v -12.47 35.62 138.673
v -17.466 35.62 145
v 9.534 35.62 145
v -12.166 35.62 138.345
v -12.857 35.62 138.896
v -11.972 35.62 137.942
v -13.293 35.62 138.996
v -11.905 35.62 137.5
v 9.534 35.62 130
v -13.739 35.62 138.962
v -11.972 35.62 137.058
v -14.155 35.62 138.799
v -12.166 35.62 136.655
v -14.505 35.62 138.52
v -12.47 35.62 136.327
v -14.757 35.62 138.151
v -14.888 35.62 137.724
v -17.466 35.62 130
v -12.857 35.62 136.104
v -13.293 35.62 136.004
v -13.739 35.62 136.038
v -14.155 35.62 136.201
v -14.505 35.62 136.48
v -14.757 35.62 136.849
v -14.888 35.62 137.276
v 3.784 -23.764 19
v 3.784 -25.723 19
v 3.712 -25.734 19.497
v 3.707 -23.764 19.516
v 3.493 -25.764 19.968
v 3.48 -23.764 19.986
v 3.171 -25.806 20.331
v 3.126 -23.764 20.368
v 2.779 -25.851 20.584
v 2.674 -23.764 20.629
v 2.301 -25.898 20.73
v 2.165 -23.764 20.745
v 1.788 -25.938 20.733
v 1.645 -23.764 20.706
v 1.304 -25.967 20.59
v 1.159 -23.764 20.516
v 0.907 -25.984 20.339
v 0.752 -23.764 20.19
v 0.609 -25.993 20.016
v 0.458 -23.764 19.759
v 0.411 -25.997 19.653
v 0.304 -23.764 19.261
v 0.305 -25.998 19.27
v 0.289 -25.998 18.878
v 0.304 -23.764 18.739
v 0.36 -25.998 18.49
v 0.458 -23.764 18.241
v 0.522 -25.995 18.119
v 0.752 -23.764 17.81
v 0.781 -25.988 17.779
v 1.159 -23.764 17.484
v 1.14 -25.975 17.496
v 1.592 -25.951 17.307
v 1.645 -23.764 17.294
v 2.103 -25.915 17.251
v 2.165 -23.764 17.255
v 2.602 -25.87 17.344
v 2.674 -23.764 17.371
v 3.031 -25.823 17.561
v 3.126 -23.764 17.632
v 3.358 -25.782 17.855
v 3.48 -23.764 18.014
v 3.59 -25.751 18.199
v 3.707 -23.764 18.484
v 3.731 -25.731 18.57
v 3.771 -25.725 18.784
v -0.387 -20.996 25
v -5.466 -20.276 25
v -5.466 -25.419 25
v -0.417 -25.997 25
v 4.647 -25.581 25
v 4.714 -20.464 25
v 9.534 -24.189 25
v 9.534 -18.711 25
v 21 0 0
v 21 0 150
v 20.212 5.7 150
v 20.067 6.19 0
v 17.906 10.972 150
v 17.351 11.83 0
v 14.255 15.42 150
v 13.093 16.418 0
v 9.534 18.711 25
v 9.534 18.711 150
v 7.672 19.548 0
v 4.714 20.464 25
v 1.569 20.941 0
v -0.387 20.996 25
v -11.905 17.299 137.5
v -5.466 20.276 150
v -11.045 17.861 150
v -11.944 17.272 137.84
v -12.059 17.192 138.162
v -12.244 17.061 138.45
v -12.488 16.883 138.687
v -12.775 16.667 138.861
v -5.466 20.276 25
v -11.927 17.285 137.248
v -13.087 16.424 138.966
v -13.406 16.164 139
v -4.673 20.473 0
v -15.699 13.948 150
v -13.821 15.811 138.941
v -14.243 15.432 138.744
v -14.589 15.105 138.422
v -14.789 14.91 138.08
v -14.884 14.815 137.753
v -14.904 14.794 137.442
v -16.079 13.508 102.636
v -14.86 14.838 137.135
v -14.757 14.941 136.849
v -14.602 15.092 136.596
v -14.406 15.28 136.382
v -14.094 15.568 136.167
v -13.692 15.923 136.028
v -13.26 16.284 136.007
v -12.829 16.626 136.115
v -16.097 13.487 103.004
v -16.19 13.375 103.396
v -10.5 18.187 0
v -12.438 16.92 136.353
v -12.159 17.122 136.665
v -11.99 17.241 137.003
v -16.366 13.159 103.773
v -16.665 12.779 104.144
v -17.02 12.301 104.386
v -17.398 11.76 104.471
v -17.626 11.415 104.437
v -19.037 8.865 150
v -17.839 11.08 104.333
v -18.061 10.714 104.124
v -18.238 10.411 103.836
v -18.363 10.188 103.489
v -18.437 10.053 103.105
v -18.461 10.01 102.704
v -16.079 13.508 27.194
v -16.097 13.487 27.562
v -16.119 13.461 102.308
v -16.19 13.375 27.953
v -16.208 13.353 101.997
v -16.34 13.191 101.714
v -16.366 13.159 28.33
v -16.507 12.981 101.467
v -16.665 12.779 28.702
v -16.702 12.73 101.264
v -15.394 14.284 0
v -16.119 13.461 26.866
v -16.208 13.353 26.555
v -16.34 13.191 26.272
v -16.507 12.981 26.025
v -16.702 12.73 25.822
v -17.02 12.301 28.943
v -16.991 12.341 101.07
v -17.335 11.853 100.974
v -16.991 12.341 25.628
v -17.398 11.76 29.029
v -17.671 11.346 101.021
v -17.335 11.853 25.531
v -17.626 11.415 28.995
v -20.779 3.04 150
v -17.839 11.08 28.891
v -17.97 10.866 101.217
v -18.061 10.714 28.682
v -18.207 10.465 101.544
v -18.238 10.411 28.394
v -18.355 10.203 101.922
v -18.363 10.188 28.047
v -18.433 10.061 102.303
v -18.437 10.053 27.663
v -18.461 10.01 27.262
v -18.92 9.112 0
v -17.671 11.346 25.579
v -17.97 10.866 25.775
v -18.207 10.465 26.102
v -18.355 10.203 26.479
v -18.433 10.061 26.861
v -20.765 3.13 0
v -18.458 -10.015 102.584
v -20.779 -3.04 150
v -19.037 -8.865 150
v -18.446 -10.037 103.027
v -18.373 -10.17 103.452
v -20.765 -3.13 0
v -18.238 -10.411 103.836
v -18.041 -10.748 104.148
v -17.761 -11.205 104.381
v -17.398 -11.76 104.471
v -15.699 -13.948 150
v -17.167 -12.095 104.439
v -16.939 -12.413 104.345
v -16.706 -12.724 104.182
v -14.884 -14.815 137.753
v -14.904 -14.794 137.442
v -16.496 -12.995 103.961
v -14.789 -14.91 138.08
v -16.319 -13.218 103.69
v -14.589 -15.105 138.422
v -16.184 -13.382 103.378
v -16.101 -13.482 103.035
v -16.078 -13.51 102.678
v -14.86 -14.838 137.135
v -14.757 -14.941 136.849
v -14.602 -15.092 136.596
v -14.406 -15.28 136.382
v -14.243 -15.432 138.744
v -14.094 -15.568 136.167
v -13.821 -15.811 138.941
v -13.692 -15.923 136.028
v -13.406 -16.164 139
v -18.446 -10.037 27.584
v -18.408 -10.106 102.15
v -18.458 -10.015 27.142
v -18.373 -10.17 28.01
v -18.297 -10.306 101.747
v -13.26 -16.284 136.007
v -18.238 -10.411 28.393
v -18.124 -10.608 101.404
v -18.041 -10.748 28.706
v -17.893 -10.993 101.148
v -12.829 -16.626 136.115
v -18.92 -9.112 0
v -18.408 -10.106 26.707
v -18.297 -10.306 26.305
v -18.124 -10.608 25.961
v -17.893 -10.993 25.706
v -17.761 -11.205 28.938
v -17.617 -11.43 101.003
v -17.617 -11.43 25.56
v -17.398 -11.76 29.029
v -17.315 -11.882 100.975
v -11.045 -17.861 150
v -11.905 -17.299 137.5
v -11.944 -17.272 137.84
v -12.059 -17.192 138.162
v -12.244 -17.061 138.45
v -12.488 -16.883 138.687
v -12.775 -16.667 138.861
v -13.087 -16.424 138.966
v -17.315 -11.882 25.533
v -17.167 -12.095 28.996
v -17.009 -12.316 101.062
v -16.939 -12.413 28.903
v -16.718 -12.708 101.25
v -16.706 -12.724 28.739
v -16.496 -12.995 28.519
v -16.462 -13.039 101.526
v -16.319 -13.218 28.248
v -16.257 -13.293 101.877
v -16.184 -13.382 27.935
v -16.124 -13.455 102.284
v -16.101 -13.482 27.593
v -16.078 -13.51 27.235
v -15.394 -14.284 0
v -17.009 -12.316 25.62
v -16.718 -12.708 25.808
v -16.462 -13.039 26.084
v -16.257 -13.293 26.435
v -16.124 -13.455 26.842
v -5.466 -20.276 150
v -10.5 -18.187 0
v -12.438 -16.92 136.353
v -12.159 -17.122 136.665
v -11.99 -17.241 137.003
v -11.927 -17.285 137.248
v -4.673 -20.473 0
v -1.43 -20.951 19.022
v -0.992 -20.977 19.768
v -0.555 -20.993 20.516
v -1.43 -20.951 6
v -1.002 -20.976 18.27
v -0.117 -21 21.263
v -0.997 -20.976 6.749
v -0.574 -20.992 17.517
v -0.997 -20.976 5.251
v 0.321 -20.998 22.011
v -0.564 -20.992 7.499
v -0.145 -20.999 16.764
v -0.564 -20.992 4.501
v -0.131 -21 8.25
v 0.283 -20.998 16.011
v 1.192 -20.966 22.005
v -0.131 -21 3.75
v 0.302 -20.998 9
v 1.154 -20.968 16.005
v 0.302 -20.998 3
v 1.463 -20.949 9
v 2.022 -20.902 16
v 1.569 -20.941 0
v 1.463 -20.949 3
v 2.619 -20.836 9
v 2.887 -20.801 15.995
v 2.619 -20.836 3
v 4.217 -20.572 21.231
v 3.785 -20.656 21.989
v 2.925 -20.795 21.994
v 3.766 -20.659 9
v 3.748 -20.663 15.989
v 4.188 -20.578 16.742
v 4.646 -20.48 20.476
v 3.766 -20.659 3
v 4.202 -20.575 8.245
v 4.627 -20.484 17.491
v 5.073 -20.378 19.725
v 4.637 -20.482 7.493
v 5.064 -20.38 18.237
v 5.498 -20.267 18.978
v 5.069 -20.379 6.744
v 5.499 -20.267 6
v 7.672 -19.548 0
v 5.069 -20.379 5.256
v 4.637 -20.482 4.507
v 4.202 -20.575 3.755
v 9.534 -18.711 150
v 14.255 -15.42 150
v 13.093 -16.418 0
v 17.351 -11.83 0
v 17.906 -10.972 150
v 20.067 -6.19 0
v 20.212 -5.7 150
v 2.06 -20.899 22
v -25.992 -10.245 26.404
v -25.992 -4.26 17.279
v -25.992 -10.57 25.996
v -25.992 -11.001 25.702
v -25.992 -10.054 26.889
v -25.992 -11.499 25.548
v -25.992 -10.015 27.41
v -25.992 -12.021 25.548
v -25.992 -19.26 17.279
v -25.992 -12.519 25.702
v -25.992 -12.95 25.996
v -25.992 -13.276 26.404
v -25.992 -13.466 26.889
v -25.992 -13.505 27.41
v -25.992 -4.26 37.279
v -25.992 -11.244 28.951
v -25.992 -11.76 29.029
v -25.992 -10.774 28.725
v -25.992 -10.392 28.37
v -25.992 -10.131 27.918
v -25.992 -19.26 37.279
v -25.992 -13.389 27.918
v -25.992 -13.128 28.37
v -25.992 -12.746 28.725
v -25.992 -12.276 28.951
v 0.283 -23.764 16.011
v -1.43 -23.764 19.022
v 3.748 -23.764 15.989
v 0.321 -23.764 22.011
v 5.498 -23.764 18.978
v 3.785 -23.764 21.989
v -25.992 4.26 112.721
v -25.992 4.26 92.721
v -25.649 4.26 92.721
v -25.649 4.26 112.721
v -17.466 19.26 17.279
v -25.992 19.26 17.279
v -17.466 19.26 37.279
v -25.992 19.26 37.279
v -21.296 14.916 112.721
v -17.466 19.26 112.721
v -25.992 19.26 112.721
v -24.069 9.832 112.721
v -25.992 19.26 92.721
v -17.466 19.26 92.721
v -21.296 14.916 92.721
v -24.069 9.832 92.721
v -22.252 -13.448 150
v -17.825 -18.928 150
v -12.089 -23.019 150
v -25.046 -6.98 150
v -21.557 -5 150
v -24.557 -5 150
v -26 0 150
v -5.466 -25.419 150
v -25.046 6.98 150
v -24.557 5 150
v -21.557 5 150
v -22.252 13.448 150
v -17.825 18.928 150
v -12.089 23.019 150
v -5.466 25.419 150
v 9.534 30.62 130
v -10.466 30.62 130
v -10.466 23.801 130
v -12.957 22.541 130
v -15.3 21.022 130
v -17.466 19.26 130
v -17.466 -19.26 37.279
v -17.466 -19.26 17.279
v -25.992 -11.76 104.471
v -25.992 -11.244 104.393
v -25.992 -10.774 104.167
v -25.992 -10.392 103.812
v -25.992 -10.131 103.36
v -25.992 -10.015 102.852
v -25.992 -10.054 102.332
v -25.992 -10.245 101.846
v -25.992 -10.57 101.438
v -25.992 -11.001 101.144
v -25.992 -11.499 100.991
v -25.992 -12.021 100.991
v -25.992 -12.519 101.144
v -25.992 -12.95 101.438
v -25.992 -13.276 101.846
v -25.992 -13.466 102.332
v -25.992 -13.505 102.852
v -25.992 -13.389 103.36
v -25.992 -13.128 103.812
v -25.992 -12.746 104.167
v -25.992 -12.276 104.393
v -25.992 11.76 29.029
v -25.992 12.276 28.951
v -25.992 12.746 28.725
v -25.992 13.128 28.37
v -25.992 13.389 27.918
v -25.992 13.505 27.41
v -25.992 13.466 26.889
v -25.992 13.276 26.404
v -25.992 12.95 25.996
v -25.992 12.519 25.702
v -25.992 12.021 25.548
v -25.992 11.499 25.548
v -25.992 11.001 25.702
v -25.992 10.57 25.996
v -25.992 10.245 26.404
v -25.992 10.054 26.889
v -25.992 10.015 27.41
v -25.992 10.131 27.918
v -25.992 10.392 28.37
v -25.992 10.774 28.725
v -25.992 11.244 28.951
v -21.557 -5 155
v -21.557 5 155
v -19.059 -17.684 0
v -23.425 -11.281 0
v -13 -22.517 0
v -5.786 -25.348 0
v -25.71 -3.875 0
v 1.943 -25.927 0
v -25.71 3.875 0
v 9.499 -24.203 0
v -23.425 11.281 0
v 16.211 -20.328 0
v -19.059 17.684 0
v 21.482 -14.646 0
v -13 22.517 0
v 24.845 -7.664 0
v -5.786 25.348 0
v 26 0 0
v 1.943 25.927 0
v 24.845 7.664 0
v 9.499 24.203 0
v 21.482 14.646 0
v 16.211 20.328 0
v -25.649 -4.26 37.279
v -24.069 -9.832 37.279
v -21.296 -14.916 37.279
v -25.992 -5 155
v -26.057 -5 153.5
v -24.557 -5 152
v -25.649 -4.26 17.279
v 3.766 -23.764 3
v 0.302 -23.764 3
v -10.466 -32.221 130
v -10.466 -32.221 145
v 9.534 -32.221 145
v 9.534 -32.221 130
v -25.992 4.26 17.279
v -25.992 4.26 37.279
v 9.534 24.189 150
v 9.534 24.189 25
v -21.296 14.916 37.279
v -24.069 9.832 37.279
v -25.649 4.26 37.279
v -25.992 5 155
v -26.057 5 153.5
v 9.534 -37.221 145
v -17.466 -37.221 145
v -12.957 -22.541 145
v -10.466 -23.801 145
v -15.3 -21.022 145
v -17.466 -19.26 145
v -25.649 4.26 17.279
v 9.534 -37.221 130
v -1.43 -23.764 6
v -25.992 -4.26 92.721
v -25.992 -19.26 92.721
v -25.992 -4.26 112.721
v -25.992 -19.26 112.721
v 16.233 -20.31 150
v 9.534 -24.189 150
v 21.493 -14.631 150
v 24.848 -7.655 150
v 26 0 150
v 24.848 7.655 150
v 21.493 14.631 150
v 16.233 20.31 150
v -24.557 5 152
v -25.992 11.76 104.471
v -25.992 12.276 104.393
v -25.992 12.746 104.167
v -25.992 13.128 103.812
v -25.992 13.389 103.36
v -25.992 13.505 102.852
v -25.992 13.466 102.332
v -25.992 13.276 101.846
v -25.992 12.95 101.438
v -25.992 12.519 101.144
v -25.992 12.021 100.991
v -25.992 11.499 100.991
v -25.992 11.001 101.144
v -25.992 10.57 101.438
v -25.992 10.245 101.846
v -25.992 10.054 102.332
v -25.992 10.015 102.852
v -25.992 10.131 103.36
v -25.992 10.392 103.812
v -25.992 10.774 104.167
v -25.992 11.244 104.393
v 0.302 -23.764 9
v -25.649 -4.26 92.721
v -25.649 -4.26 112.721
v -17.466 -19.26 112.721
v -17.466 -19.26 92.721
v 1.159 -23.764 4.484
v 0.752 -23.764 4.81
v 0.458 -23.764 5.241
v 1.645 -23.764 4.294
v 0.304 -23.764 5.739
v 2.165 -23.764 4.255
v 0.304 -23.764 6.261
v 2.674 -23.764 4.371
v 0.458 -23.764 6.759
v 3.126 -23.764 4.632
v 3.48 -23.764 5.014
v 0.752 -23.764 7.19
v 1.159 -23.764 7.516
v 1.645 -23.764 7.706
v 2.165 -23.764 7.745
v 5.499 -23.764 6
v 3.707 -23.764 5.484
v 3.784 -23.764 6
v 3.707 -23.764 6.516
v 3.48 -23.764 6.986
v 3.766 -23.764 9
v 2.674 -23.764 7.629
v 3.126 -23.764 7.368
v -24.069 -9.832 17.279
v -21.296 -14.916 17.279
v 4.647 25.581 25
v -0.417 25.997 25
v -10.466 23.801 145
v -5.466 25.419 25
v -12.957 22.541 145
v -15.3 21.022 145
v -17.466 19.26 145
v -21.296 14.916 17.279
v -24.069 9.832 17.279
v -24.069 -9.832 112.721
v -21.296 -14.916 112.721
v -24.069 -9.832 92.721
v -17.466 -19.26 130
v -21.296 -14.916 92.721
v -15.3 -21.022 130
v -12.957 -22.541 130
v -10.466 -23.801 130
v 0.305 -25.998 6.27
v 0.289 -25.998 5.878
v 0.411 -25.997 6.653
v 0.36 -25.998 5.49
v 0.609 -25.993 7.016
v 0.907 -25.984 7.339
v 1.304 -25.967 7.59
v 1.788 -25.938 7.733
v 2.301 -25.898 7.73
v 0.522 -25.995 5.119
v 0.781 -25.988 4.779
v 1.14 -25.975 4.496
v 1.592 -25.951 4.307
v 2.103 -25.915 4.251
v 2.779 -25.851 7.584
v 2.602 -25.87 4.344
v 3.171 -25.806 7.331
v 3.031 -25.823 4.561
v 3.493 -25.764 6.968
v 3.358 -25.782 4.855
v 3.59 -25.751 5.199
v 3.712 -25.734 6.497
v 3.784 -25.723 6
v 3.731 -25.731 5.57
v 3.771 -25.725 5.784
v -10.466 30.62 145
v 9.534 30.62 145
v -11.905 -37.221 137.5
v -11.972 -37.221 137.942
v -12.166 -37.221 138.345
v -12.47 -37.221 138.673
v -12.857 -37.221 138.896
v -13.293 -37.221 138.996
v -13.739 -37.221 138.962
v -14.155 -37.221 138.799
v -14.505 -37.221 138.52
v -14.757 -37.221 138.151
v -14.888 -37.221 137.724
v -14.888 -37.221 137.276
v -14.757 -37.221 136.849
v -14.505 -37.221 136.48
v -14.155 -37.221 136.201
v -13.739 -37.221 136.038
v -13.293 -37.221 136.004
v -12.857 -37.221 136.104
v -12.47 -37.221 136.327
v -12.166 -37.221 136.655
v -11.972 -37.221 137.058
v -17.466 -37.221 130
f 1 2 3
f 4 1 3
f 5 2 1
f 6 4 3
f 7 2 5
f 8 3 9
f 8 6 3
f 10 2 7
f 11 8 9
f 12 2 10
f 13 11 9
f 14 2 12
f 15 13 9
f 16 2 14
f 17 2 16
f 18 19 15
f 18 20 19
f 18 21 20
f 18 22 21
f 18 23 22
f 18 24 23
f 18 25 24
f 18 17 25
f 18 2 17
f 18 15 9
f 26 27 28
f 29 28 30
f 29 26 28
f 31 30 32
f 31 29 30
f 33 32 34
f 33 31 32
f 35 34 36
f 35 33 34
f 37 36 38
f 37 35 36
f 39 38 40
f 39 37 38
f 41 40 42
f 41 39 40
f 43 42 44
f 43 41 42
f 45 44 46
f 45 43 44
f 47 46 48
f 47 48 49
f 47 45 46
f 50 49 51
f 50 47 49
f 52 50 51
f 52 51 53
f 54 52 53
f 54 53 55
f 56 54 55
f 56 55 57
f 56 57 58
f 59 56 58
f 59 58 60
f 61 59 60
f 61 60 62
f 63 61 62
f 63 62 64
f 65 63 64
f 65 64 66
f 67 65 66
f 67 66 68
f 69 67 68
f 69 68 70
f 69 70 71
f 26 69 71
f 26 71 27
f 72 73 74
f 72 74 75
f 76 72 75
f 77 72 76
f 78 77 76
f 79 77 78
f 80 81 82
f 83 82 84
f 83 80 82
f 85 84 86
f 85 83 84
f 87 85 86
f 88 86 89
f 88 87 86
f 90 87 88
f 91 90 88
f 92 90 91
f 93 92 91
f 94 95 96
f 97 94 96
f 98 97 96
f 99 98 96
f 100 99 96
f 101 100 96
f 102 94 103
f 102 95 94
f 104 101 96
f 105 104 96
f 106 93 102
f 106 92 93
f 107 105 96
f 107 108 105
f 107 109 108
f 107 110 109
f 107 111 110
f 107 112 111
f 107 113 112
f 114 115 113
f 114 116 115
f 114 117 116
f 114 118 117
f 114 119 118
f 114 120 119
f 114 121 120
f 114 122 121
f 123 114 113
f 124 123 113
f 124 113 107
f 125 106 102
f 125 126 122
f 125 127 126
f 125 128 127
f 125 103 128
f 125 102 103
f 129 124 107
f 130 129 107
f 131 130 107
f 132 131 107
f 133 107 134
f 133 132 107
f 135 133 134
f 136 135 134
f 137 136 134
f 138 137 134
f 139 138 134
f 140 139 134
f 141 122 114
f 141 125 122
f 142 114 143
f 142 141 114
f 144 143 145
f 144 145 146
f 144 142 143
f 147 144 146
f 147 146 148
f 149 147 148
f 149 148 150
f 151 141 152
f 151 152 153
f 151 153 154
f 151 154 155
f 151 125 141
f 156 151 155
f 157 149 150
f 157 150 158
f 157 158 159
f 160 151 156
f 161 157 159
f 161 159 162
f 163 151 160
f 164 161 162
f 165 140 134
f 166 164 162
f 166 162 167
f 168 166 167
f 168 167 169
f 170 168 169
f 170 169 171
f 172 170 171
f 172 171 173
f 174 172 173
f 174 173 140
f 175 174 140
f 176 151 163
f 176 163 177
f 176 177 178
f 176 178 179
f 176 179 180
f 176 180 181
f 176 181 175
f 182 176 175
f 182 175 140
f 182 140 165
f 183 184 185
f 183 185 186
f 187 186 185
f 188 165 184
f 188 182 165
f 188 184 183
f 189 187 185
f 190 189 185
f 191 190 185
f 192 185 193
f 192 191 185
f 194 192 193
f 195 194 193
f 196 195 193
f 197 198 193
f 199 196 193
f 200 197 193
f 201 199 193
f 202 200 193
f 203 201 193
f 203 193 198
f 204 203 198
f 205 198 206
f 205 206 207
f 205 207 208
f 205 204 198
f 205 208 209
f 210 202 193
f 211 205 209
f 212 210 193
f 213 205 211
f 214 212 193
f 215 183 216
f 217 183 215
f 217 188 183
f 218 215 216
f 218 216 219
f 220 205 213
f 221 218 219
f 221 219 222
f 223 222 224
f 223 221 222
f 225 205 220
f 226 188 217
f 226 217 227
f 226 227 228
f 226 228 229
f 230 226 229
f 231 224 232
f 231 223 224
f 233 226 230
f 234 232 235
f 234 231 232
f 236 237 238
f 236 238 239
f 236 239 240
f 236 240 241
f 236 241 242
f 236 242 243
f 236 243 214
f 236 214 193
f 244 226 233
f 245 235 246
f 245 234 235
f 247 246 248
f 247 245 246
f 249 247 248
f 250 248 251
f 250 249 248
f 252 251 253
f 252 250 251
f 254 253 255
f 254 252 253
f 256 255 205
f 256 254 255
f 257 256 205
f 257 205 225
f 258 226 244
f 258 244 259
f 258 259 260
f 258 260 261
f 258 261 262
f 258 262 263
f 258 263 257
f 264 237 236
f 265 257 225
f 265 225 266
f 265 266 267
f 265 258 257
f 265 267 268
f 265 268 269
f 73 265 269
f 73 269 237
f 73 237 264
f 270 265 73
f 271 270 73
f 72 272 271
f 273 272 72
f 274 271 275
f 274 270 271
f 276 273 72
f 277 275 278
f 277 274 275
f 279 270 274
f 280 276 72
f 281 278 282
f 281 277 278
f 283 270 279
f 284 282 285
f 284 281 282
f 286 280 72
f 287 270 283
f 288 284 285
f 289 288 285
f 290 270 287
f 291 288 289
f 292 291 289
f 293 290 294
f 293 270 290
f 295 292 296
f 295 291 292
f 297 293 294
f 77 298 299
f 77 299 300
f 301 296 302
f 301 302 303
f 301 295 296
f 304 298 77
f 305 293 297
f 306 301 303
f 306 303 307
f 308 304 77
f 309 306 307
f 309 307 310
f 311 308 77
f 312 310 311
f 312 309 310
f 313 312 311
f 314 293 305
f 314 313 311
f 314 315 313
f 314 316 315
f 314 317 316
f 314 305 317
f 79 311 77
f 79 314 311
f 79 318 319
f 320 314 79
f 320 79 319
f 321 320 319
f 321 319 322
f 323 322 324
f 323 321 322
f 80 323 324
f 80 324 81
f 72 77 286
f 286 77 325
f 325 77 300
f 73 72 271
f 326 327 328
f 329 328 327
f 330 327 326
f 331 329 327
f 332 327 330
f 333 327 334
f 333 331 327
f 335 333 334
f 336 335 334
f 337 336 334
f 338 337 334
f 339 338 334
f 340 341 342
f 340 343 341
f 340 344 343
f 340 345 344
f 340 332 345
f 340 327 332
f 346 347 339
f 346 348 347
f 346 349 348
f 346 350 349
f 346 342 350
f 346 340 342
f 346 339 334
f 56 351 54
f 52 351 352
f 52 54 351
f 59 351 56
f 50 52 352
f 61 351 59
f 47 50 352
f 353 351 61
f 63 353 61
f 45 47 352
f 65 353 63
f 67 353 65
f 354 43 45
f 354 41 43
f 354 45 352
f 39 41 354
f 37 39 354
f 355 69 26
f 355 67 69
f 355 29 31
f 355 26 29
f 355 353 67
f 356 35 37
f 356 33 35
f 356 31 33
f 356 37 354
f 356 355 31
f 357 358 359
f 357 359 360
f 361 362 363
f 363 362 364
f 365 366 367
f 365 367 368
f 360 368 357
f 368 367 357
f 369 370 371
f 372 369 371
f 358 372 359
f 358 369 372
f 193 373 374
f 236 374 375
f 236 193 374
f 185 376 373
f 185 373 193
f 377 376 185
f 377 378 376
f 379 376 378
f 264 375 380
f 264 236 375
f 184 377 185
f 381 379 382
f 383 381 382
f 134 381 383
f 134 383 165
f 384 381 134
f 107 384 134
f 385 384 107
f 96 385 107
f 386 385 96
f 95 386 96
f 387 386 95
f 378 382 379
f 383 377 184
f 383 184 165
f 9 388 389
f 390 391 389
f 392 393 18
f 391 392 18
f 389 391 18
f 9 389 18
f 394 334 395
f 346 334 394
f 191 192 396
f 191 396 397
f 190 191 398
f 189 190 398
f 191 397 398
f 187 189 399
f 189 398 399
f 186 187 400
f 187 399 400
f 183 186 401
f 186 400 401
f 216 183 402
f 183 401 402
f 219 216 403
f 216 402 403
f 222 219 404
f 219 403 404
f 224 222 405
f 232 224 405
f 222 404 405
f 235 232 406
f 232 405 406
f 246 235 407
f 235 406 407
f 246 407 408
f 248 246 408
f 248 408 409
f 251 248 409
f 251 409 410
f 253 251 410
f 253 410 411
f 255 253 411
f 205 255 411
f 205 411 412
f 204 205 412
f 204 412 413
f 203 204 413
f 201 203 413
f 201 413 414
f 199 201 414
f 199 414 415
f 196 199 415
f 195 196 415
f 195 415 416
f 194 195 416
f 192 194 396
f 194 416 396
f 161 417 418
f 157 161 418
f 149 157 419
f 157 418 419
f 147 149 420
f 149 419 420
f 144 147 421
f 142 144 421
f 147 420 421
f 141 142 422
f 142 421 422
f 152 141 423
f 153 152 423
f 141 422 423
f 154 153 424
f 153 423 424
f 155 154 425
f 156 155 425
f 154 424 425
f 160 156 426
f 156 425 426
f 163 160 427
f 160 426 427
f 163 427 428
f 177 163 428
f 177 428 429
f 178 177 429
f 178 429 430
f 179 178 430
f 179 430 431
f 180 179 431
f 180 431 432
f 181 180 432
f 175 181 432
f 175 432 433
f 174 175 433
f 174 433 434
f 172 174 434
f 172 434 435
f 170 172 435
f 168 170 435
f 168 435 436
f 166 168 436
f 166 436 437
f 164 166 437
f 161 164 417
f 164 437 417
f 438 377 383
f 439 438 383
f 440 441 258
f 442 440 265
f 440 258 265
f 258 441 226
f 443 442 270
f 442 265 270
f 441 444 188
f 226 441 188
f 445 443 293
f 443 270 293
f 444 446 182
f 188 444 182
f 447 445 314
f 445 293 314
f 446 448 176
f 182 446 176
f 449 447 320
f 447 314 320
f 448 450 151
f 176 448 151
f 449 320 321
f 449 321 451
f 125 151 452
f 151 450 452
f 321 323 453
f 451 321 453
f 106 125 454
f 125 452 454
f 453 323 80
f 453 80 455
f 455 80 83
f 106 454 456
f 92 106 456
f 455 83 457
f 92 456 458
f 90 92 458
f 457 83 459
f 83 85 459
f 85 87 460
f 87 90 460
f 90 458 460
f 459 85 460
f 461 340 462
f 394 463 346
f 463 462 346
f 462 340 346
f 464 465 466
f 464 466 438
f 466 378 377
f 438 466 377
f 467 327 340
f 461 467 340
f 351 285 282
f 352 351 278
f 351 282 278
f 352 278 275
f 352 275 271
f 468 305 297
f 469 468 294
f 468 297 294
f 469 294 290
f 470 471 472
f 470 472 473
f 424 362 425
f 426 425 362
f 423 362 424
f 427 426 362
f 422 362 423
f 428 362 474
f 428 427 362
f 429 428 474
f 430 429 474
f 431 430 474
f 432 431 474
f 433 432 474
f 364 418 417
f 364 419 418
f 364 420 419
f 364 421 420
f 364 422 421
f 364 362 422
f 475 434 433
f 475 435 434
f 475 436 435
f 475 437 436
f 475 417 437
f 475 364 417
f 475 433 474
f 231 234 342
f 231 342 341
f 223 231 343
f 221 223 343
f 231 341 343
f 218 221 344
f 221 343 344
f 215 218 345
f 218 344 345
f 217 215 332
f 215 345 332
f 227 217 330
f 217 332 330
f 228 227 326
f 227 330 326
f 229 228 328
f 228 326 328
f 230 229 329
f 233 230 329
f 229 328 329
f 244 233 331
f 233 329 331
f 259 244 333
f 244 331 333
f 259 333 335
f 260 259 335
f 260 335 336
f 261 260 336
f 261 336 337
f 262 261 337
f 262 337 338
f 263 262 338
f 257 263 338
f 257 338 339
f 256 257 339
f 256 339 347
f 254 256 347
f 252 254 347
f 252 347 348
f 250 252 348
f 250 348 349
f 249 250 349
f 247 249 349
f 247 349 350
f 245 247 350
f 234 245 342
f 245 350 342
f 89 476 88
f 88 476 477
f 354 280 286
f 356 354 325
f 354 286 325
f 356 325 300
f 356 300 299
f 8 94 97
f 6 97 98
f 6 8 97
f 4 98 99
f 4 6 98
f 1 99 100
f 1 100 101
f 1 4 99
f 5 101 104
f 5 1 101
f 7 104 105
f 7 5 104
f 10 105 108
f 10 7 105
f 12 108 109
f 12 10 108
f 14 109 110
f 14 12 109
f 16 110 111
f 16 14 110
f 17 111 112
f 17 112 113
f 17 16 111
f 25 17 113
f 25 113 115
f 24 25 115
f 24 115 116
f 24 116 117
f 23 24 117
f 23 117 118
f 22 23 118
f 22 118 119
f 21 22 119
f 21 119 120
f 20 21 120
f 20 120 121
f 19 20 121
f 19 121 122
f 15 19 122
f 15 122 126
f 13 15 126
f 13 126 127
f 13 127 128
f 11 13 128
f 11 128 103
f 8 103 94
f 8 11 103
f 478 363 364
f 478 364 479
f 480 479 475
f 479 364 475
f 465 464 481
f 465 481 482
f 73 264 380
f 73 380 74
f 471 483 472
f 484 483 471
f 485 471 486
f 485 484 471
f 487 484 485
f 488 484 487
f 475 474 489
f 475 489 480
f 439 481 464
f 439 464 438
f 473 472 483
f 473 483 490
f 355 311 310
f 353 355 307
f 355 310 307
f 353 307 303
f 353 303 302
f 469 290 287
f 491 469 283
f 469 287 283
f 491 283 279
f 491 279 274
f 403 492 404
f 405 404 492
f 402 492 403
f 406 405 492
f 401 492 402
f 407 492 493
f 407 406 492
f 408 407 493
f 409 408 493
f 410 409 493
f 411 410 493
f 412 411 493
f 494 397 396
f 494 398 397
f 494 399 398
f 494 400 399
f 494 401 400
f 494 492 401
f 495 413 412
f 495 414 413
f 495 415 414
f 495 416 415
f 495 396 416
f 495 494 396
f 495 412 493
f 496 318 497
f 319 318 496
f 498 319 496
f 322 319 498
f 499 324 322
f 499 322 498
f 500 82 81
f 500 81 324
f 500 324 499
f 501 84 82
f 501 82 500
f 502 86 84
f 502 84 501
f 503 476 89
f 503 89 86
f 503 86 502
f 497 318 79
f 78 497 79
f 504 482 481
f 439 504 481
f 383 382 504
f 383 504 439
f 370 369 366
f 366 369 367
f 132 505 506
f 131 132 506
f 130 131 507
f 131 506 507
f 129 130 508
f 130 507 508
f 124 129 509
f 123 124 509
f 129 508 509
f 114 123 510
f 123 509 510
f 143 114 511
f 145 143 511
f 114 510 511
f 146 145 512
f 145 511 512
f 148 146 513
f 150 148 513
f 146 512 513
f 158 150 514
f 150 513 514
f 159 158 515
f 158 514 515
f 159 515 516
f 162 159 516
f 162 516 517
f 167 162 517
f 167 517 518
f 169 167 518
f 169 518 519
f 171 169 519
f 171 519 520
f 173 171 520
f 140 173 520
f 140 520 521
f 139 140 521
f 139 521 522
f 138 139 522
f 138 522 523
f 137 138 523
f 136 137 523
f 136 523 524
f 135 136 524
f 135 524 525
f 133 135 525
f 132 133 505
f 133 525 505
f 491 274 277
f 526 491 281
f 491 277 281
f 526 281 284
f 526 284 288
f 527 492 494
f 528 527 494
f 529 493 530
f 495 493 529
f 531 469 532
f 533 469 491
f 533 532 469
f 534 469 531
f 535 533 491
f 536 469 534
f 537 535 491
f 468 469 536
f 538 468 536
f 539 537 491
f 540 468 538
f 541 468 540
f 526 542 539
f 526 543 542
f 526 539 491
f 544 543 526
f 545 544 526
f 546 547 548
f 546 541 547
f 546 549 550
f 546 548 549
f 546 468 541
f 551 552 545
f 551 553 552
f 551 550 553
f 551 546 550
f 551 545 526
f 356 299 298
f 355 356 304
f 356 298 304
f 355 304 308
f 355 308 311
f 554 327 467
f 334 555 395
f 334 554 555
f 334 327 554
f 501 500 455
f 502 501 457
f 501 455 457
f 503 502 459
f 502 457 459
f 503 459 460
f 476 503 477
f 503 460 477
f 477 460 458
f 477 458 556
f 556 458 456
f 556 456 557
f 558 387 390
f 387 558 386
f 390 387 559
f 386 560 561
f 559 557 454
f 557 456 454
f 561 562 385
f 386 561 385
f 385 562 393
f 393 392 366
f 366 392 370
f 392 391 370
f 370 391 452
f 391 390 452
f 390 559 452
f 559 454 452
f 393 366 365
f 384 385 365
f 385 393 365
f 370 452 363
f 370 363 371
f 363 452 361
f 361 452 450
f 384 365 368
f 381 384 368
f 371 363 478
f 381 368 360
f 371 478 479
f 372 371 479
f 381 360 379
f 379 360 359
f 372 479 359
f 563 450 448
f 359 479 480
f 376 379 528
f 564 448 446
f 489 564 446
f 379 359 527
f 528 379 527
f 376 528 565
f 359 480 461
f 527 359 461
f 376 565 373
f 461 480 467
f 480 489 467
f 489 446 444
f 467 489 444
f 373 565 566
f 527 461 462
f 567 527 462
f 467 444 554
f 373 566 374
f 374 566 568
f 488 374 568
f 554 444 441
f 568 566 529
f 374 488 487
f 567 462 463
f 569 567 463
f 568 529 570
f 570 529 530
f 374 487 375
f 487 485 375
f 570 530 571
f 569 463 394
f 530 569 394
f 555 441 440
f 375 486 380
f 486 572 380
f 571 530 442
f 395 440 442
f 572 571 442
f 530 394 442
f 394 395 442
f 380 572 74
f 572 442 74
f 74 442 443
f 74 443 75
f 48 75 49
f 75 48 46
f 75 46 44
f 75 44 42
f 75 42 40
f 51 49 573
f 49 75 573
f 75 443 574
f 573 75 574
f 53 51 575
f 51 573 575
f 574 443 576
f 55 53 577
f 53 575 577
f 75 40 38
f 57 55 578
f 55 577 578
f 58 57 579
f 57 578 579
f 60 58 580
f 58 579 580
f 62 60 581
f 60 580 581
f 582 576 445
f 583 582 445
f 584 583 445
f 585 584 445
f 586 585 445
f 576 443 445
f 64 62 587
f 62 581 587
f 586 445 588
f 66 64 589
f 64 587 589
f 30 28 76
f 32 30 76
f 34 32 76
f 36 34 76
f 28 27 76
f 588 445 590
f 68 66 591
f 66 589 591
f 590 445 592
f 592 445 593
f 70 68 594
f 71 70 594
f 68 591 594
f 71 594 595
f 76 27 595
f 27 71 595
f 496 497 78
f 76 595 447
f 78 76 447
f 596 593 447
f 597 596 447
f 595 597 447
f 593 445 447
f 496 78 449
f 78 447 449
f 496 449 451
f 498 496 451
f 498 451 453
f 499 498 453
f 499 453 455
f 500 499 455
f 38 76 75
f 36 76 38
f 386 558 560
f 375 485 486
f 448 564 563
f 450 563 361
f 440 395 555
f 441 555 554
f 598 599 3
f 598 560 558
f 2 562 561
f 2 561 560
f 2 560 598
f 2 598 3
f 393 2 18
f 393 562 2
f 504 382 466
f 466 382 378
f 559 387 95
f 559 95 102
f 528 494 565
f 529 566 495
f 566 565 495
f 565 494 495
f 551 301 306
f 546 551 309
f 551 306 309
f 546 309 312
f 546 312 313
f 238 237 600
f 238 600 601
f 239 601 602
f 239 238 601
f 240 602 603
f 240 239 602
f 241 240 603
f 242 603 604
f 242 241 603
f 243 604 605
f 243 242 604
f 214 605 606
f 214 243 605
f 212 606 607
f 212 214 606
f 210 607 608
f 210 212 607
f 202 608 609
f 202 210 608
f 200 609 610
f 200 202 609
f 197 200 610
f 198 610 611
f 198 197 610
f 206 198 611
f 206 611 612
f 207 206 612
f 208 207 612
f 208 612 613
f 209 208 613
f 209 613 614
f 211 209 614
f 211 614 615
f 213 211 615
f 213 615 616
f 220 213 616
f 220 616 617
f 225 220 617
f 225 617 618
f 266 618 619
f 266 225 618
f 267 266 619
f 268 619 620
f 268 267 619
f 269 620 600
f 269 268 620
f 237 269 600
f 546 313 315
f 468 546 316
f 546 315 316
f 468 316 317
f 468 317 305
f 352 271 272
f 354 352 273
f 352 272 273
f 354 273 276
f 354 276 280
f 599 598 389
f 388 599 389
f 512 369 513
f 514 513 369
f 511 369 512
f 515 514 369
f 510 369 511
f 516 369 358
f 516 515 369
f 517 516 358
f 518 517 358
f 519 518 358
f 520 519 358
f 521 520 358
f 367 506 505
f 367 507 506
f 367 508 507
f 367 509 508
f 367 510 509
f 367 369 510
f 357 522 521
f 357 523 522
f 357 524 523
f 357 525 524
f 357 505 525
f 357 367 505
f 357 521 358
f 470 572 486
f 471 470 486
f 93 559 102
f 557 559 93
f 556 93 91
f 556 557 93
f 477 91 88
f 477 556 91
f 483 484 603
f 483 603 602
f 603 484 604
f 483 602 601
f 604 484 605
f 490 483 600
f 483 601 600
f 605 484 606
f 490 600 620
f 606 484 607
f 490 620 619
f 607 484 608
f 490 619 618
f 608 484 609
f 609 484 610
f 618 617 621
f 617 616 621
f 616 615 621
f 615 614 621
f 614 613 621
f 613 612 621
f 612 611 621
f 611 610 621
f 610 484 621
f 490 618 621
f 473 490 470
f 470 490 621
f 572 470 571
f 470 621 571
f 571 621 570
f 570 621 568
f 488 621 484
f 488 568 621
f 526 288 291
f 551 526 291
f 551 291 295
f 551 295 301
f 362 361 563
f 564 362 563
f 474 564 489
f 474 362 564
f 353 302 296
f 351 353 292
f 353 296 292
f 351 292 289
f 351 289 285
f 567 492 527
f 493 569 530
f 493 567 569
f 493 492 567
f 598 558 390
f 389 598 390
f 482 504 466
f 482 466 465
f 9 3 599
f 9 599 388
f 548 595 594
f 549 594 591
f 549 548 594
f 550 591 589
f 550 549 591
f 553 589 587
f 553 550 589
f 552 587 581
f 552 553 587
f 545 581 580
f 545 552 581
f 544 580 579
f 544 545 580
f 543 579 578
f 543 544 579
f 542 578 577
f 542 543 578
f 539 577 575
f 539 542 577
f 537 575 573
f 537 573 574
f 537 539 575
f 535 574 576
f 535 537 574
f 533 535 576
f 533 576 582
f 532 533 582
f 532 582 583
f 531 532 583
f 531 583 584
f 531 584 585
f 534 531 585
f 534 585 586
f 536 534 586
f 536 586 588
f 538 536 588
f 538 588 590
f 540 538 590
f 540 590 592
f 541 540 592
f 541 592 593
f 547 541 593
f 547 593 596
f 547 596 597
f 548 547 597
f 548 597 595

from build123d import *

# Parameters (mm, degrees)
ESBO_O1_R                     = 26
ESBO_O1_R_2                   = 21
RESSALTO_EXTRUS_O1_DEPTH      = 150
CORTE_EXTRUS_O1_DEPTH         = 162.271451737
CORTE_EXTRUS_O1_DEPTH_BACK    = 162.271451737
ESBO_O3_W                     = 125
ESBO_O3_H                     = 15
RESSALTO_EXTRUS_O2_REACH      = 163.271
RESSALTO_EXTRUS_O2_END_RADIUS = 26
ESBO_O4_W                     = 15
ESBO_O4_H                     = 7
ESBO_O5_W                     = 7
ESBO_O5_H                     = 15
RESSALTO_EXTRUS_O3_DEPTH      = 10
ESBO_O6_W                     = 15
ESBO_O6_H                     = 5
RESSALTO_EXTRUS_O4_DEPTH      = 20
RESSALTO_EXTRUS_O5_REACH      = 166.697
RESSALTO_EXTRUS_O5_END_RADIUS = 26
ESBO_O7_W                     = 15
ESBO_O7_H                     = 7
ESBO_O8_W                     = 7
ESBO_O8_H                     = 15
RESSALTO_EXTRUS_O6_DEPTH      = 10
ESBO_O9_W                     = 15
ESBO_O9_H                     = 5
RESSALTO_EXTRUS_O7_DEPTH      = 20
CORTE_EXTRUS_O2_DEPTH         = 169.765720645
CORTE_EXTRUS_O2_DEPTH_BACK    = 169.765720645
ESBO_O10_R                    = 1.5
RESSALTO_EXTRUS_O8_REACH      = 165.06
RESSALTO_EXTRUS_O8_END_RADIUS = 26
ESBO_O14_W                    = 15
ESBO_O14_H                    = 20
ESBO_O15_R                    = 1.75
CORTE_EXTRUS_O3_DEPTH         = 15
CORTE_EXTRUS_O4_DEPTH         = 3
CORTE_EXTRUS_O4_DEPTH_BACK    = 18
ESBO_O17_R                    = 1.75
CORTE_EXTRUS_O5_START         = -41.1
CORTE_EXTRUS_O5_DEPTH         = 3.5
ESBO_O19_W                    = 3
ESBO_O19_H                    = 5
RESSALTO_EXTRUS_O9_DEPTH      = 5
RESSALTO_EXTRUS_O10_DEPTH     = 10
CORTE_EXTRUS_O6_DEPTH         = 163.586633287


with BuildPart() as part:
    # Esboço1 → Ressalto-extrusão1 (new body)
    with BuildSketch(Plane.XY):
        Circle(ESBO_O1_R)
        Circle(ESBO_O1_R_2, mode=Mode.SUBTRACT)
    extrude(amount=RESSALTO_EXTRUS_O1_DEPTH)

    # Esboço3 → Corte-extrusão1 (cut, two sides: drawn at the far end of the back side and taken through both)
    with BuildSketch(Plane(origin=(0, -27.221059229, 0), x_dir=(0, 0, -1), z_dir=(0, -1, 0)).offset(-CORTE_EXTRUS_O1_DEPTH_BACK)):
        with Locations((-87.5, 2.034407051)):
            Rectangle(ESBO_O3_W, ESBO_O3_H)
    extrude(amount=CORTE_EXTRUS_O1_DEPTH + CORTE_EXTRUS_O1_DEPTH_BACK, mode=Mode.SUBTRACT)

    # Ressalto-extrusão2: up to this cylinder (the profile starts outside it)
    ressalto_extrus_o2_end = Plane(origin=(0, 0, 137.5), z_dir=(0, 0, -1)) * Cylinder(RESSALTO_EXTRUS_O2_END_RADIUS, 379.542, mode=Mode.PRIVATE)
    # Esboço4 → Ressalto-extrusão2 (add, up to the surface)
    with BuildSketch(Plane(origin=(0, -27.221059229, 0), x_dir=(0, 0, -1), z_dir=(0, -1, 0)), mode=Mode.PRIVATE) as ressalto_extrus_o2_sk1:
        with Locations((-137.5, -13.965592949)):
            Rectangle(ESBO_O4_W, ESBO_O4_H)
    ressalto_extrus_o2_tool1 = extrude(ressalto_extrus_o2_sk1.sketch, amount=-RESSALTO_EXTRUS_O2_REACH, mode=Mode.PRIVATE) - ressalto_extrus_o2_end
    add(ressalto_extrus_o2_tool1.solids().sort_by_distance((-13.965593, -27.221059, 137.5))[0])

    # Esboço5 → Ressalto-extrusão3 (add)
    with BuildSketch(Plane.XZ.offset(27.221059229)):
        with Locations((-13.965592949, 137.5)):
            Rectangle(ESBO_O5_W, ESBO_O5_H)
    extrude(amount=RESSALTO_EXTRUS_O3_DEPTH)

    # Esboço6 → Ressalto-extrusão4 (add)
    with BuildSketch(Plane(origin=(-10.465592949, 0, 0), x_dir=(0, 0, -1), z_dir=(1, 0, 0))):
        with Locations((-137.5, -34.721059229)):
            Rectangle(ESBO_O6_W, ESBO_O6_H)
    extrude(amount=RESSALTO_EXTRUS_O4_DEPTH)

    # Ressalto-extrusão5: up to this cylinder (the profile starts outside it)
    ressalto_extrus_o5_end = Plane(origin=(0, 0, 137.5), z_dir=(0, 0, -1)) * Cylinder(RESSALTO_EXTRUS_O5_END_RADIUS, 386.394, mode=Mode.PRIVATE)
    # Esboço7 → Ressalto-extrusão5 (add, up to the surface)
    with BuildSketch(Plane.ZX.offset(25.620333295), mode=Mode.PRIVATE) as ressalto_extrus_o5_sk1:
        with Locations((137.5, -13.965592949)):
            Rectangle(ESBO_O7_W, ESBO_O7_H)
    ressalto_extrus_o5_tool1 = extrude(ressalto_extrus_o5_sk1.sketch, amount=-RESSALTO_EXTRUS_O5_REACH, mode=Mode.PRIVATE) - ressalto_extrus_o5_end
    add(ressalto_extrus_o5_tool1.solids().sort_by_distance((-13.965593, 25.620333, 137.5))[0])

    # Esboço8 → Ressalto-extrusão6 (add)
    with BuildSketch(Plane(origin=(0, 25.620333295, 0), x_dir=(1, 0, 0), z_dir=(0, 1, 0))):
        with Locations((-13.965592949, -137.5)):
            Rectangle(ESBO_O8_W, ESBO_O8_H)
    extrude(amount=RESSALTO_EXTRUS_O6_DEPTH)

    # Esboço9 → Ressalto-extrusão7 (add)
    with BuildSketch(Plane(origin=(-10.465592949, 0, 0), x_dir=(0, 0, -1), z_dir=(1, 0, 0))):
        with Locations((-137.5, 33.120333295)):
            Rectangle(ESBO_O9_W, ESBO_O9_H)
    extrude(amount=RESSALTO_EXTRUS_O7_DEPTH)

    # Esboço10 → Corte-extrusão2 (cut, two sides: drawn at the far end of the back side and taken through both)
    with BuildSketch(Plane.XZ.offset(37.221059229).offset(-CORTE_EXTRUS_O2_DEPTH_BACK)):
        with Locations((-13.4052452, 137.5)):
            Circle(ESBO_O10_R)
    extrude(amount=CORTE_EXTRUS_O2_DEPTH + CORTE_EXTRUS_O2_DEPTH_BACK, mode=Mode.SUBTRACT)

    # Ressalto-extrusão8: up to this cylinder (the profile starts outside it)
    ressalto_extrus_o8_end = Plane(origin=(0, 0, 65), z_dir=(0, 0, -1)) * Cylinder(RESSALTO_EXTRUS_O8_END_RADIUS, 458.562278, mode=Mode.PRIVATE)
    # Esboço14 → Ressalto-extrusão8 (add, up to the surface)
    with BuildSketch(Plane(origin=(-25.991571687, 0, 0), x_dir=(0, -1, 0), z_dir=(-1, 0, 0)), mode=Mode.PRIVATE) as ressalto_extrus_o8_sk1:
        with Locations((-11.76014182, 102.721139131)):
            Rectangle(ESBO_O14_W, ESBO_O14_H)
    ressalto_extrus_o8_tool1 = extrude(ressalto_extrus_o8_sk1.sketch, amount=-RESSALTO_EXTRUS_O8_REACH, mode=Mode.PRIVATE) - ressalto_extrus_o8_end
    add(ressalto_extrus_o8_tool1.solids().sort_by_distance((-25.991572, 11.760142, 102.721139))[0])
    # Esboço14 → Ressalto-extrusão8 (add, up to the surface)
    with BuildSketch(Plane(origin=(-25.991571687, 0, 0), x_dir=(0, -1, 0), z_dir=(-1, 0, 0)), mode=Mode.PRIVATE) as ressalto_extrus_o8_sk2:
        with Locations((11.76014182, 102.721139131)):
            Rectangle(ESBO_O14_W, ESBO_O14_H)
    ressalto_extrus_o8_tool2 = extrude(ressalto_extrus_o8_sk2.sketch, amount=-RESSALTO_EXTRUS_O8_REACH, mode=Mode.PRIVATE) - ressalto_extrus_o8_end
    add(ressalto_extrus_o8_tool2.solids().sort_by_distance((-25.991572, -11.760142, 102.721139))[0])
    # Esboço14 → Ressalto-extrusão8 (add, up to the surface)
    with BuildSketch(Plane(origin=(-25.991571687, 0, 0), x_dir=(0, -1, 0), z_dir=(-1, 0, 0)), mode=Mode.PRIVATE) as ressalto_extrus_o8_sk3:
        with Locations((11.76014182, 27.278860869)):
            Rectangle(ESBO_O14_W, ESBO_O14_H)
    ressalto_extrus_o8_tool3 = extrude(ressalto_extrus_o8_sk3.sketch, amount=-RESSALTO_EXTRUS_O8_REACH, mode=Mode.PRIVATE) - ressalto_extrus_o8_end
    add(ressalto_extrus_o8_tool3.solids().sort_by_distance((-25.991572, -11.760142, 27.278861))[0])
    # Esboço14 → Ressalto-extrusão8 (add, up to the surface)
    with BuildSketch(Plane(origin=(-25.991571687, 0, 0), x_dir=(0, -1, 0), z_dir=(-1, 0, 0)), mode=Mode.PRIVATE) as ressalto_extrus_o8_sk4:
        with Locations((-11.76014182, 27.278860869)):
            Rectangle(ESBO_O14_W, ESBO_O14_H)
    ressalto_extrus_o8_tool4 = extrude(ressalto_extrus_o8_sk4.sketch, amount=-RESSALTO_EXTRUS_O8_REACH, mode=Mode.PRIVATE) - ressalto_extrus_o8_end
    add(ressalto_extrus_o8_tool4.solids().sort_by_distance((-25.991572, 11.760142, 27.278861))[0])

    # Esboço15 → Corte-extrusão3 (cut)
    with BuildSketch(Plane.ZY.offset(25.991571687)):
        with Locations((27.278860869, 11.76014182)):
            Circle(ESBO_O15_R)
        with Locations((102.721139131, 11.76014182)):
            Circle(ESBO_O15_R)
        with Locations((102.721139131, -11.76014182)):
            Circle(ESBO_O15_R)
        with Locations((27.278860869, -11.76014182)):
            Circle(ESBO_O15_R)
    extrude(amount=-CORTE_EXTRUS_O3_DEPTH, mode=Mode.SUBTRACT)

    # Esboço17 → Corte-extrusão4 (cut, two sides: drawn at the far end of the back side and taken through both)
    with BuildSketch(Plane(origin=(0, -27.221059229, 0), x_dir=(0, 0, -1), z_dir=(0, -1, 0)).offset(-CORTE_EXTRUS_O4_DEPTH_BACK)):
        with Locations(Location((-19, 2.034407051, 0), (0, 0, 90))):
            Circle(ESBO_O17_R)
        with Locations(Location((-6, 2.034407051, 0), (0, 0, 90))):
            Circle(ESBO_O17_R)
    extrude(amount=CORTE_EXTRUS_O4_DEPTH + CORTE_EXTRUS_O4_DEPTH_BACK, mode=Mode.SUBTRACT)

    # Esboço18 → Corte-extrusão5 (cut)
    with BuildSketch(Plane.ZX.offset(20.835810462).offset(CORTE_EXTRUS_O5_START)):
        Polygon((9, 0.302356243), (9, 3.766457858), (6, 5.498508666), (3, 3.766457858), (3, 0.302356243), (6, -1.429694564), align=None)
        Polygon((21.989029976, 3.785321041), (18.978178993, 5.498439938), (15.989149016, 3.747525948), (16.010970024, 0.283493061), (19.021821007, -1.429625836), (22.010850984, 0.321288154), align=None)
    extrude(amount=-CORTE_EXTRUS_O5_DEPTH, mode=Mode.SUBTRACT)

    # Esboço19 → Ressalto-extrusão9 (add)
    with BuildSketch(Plane.XY.offset(150)):
        with Locations((-23.057246572, 2.5)):
            Rectangle(ESBO_O19_W, ESBO_O19_H)
        with Locations((-23.057246572, -2.5)):
            Rectangle(ESBO_O19_W, ESBO_O19_H)
    extrude(amount=RESSALTO_EXTRUS_O9_DEPTH)

    # Esboço20 → Ressalto-extrusão10 (add)
    with BuildSketch(Plane(origin=(0, 5, 0), x_dir=(1, 0, 0), z_dir=(0, 1, 0))):
        Polygon((-24.557246572, -155), (-24.557246572, -152), (-27.557246572, -155), align=None)
    extrude(amount=-RESSALTO_EXTRUS_O10_DEPTH)

    # Esboço23 → Corte-extrusão6 (cut, through all)
    with BuildSketch(Plane.XZ.offset(5)):
        Polygon((-27.557246572, 155), (-25.991571687, 155), (-26.057246572, 153.5), align=None)
    extrude(amount=-CORTE_EXTRUS_O6_DEPTH, mode=Mode.SUBTRACT)


solid = part.part
